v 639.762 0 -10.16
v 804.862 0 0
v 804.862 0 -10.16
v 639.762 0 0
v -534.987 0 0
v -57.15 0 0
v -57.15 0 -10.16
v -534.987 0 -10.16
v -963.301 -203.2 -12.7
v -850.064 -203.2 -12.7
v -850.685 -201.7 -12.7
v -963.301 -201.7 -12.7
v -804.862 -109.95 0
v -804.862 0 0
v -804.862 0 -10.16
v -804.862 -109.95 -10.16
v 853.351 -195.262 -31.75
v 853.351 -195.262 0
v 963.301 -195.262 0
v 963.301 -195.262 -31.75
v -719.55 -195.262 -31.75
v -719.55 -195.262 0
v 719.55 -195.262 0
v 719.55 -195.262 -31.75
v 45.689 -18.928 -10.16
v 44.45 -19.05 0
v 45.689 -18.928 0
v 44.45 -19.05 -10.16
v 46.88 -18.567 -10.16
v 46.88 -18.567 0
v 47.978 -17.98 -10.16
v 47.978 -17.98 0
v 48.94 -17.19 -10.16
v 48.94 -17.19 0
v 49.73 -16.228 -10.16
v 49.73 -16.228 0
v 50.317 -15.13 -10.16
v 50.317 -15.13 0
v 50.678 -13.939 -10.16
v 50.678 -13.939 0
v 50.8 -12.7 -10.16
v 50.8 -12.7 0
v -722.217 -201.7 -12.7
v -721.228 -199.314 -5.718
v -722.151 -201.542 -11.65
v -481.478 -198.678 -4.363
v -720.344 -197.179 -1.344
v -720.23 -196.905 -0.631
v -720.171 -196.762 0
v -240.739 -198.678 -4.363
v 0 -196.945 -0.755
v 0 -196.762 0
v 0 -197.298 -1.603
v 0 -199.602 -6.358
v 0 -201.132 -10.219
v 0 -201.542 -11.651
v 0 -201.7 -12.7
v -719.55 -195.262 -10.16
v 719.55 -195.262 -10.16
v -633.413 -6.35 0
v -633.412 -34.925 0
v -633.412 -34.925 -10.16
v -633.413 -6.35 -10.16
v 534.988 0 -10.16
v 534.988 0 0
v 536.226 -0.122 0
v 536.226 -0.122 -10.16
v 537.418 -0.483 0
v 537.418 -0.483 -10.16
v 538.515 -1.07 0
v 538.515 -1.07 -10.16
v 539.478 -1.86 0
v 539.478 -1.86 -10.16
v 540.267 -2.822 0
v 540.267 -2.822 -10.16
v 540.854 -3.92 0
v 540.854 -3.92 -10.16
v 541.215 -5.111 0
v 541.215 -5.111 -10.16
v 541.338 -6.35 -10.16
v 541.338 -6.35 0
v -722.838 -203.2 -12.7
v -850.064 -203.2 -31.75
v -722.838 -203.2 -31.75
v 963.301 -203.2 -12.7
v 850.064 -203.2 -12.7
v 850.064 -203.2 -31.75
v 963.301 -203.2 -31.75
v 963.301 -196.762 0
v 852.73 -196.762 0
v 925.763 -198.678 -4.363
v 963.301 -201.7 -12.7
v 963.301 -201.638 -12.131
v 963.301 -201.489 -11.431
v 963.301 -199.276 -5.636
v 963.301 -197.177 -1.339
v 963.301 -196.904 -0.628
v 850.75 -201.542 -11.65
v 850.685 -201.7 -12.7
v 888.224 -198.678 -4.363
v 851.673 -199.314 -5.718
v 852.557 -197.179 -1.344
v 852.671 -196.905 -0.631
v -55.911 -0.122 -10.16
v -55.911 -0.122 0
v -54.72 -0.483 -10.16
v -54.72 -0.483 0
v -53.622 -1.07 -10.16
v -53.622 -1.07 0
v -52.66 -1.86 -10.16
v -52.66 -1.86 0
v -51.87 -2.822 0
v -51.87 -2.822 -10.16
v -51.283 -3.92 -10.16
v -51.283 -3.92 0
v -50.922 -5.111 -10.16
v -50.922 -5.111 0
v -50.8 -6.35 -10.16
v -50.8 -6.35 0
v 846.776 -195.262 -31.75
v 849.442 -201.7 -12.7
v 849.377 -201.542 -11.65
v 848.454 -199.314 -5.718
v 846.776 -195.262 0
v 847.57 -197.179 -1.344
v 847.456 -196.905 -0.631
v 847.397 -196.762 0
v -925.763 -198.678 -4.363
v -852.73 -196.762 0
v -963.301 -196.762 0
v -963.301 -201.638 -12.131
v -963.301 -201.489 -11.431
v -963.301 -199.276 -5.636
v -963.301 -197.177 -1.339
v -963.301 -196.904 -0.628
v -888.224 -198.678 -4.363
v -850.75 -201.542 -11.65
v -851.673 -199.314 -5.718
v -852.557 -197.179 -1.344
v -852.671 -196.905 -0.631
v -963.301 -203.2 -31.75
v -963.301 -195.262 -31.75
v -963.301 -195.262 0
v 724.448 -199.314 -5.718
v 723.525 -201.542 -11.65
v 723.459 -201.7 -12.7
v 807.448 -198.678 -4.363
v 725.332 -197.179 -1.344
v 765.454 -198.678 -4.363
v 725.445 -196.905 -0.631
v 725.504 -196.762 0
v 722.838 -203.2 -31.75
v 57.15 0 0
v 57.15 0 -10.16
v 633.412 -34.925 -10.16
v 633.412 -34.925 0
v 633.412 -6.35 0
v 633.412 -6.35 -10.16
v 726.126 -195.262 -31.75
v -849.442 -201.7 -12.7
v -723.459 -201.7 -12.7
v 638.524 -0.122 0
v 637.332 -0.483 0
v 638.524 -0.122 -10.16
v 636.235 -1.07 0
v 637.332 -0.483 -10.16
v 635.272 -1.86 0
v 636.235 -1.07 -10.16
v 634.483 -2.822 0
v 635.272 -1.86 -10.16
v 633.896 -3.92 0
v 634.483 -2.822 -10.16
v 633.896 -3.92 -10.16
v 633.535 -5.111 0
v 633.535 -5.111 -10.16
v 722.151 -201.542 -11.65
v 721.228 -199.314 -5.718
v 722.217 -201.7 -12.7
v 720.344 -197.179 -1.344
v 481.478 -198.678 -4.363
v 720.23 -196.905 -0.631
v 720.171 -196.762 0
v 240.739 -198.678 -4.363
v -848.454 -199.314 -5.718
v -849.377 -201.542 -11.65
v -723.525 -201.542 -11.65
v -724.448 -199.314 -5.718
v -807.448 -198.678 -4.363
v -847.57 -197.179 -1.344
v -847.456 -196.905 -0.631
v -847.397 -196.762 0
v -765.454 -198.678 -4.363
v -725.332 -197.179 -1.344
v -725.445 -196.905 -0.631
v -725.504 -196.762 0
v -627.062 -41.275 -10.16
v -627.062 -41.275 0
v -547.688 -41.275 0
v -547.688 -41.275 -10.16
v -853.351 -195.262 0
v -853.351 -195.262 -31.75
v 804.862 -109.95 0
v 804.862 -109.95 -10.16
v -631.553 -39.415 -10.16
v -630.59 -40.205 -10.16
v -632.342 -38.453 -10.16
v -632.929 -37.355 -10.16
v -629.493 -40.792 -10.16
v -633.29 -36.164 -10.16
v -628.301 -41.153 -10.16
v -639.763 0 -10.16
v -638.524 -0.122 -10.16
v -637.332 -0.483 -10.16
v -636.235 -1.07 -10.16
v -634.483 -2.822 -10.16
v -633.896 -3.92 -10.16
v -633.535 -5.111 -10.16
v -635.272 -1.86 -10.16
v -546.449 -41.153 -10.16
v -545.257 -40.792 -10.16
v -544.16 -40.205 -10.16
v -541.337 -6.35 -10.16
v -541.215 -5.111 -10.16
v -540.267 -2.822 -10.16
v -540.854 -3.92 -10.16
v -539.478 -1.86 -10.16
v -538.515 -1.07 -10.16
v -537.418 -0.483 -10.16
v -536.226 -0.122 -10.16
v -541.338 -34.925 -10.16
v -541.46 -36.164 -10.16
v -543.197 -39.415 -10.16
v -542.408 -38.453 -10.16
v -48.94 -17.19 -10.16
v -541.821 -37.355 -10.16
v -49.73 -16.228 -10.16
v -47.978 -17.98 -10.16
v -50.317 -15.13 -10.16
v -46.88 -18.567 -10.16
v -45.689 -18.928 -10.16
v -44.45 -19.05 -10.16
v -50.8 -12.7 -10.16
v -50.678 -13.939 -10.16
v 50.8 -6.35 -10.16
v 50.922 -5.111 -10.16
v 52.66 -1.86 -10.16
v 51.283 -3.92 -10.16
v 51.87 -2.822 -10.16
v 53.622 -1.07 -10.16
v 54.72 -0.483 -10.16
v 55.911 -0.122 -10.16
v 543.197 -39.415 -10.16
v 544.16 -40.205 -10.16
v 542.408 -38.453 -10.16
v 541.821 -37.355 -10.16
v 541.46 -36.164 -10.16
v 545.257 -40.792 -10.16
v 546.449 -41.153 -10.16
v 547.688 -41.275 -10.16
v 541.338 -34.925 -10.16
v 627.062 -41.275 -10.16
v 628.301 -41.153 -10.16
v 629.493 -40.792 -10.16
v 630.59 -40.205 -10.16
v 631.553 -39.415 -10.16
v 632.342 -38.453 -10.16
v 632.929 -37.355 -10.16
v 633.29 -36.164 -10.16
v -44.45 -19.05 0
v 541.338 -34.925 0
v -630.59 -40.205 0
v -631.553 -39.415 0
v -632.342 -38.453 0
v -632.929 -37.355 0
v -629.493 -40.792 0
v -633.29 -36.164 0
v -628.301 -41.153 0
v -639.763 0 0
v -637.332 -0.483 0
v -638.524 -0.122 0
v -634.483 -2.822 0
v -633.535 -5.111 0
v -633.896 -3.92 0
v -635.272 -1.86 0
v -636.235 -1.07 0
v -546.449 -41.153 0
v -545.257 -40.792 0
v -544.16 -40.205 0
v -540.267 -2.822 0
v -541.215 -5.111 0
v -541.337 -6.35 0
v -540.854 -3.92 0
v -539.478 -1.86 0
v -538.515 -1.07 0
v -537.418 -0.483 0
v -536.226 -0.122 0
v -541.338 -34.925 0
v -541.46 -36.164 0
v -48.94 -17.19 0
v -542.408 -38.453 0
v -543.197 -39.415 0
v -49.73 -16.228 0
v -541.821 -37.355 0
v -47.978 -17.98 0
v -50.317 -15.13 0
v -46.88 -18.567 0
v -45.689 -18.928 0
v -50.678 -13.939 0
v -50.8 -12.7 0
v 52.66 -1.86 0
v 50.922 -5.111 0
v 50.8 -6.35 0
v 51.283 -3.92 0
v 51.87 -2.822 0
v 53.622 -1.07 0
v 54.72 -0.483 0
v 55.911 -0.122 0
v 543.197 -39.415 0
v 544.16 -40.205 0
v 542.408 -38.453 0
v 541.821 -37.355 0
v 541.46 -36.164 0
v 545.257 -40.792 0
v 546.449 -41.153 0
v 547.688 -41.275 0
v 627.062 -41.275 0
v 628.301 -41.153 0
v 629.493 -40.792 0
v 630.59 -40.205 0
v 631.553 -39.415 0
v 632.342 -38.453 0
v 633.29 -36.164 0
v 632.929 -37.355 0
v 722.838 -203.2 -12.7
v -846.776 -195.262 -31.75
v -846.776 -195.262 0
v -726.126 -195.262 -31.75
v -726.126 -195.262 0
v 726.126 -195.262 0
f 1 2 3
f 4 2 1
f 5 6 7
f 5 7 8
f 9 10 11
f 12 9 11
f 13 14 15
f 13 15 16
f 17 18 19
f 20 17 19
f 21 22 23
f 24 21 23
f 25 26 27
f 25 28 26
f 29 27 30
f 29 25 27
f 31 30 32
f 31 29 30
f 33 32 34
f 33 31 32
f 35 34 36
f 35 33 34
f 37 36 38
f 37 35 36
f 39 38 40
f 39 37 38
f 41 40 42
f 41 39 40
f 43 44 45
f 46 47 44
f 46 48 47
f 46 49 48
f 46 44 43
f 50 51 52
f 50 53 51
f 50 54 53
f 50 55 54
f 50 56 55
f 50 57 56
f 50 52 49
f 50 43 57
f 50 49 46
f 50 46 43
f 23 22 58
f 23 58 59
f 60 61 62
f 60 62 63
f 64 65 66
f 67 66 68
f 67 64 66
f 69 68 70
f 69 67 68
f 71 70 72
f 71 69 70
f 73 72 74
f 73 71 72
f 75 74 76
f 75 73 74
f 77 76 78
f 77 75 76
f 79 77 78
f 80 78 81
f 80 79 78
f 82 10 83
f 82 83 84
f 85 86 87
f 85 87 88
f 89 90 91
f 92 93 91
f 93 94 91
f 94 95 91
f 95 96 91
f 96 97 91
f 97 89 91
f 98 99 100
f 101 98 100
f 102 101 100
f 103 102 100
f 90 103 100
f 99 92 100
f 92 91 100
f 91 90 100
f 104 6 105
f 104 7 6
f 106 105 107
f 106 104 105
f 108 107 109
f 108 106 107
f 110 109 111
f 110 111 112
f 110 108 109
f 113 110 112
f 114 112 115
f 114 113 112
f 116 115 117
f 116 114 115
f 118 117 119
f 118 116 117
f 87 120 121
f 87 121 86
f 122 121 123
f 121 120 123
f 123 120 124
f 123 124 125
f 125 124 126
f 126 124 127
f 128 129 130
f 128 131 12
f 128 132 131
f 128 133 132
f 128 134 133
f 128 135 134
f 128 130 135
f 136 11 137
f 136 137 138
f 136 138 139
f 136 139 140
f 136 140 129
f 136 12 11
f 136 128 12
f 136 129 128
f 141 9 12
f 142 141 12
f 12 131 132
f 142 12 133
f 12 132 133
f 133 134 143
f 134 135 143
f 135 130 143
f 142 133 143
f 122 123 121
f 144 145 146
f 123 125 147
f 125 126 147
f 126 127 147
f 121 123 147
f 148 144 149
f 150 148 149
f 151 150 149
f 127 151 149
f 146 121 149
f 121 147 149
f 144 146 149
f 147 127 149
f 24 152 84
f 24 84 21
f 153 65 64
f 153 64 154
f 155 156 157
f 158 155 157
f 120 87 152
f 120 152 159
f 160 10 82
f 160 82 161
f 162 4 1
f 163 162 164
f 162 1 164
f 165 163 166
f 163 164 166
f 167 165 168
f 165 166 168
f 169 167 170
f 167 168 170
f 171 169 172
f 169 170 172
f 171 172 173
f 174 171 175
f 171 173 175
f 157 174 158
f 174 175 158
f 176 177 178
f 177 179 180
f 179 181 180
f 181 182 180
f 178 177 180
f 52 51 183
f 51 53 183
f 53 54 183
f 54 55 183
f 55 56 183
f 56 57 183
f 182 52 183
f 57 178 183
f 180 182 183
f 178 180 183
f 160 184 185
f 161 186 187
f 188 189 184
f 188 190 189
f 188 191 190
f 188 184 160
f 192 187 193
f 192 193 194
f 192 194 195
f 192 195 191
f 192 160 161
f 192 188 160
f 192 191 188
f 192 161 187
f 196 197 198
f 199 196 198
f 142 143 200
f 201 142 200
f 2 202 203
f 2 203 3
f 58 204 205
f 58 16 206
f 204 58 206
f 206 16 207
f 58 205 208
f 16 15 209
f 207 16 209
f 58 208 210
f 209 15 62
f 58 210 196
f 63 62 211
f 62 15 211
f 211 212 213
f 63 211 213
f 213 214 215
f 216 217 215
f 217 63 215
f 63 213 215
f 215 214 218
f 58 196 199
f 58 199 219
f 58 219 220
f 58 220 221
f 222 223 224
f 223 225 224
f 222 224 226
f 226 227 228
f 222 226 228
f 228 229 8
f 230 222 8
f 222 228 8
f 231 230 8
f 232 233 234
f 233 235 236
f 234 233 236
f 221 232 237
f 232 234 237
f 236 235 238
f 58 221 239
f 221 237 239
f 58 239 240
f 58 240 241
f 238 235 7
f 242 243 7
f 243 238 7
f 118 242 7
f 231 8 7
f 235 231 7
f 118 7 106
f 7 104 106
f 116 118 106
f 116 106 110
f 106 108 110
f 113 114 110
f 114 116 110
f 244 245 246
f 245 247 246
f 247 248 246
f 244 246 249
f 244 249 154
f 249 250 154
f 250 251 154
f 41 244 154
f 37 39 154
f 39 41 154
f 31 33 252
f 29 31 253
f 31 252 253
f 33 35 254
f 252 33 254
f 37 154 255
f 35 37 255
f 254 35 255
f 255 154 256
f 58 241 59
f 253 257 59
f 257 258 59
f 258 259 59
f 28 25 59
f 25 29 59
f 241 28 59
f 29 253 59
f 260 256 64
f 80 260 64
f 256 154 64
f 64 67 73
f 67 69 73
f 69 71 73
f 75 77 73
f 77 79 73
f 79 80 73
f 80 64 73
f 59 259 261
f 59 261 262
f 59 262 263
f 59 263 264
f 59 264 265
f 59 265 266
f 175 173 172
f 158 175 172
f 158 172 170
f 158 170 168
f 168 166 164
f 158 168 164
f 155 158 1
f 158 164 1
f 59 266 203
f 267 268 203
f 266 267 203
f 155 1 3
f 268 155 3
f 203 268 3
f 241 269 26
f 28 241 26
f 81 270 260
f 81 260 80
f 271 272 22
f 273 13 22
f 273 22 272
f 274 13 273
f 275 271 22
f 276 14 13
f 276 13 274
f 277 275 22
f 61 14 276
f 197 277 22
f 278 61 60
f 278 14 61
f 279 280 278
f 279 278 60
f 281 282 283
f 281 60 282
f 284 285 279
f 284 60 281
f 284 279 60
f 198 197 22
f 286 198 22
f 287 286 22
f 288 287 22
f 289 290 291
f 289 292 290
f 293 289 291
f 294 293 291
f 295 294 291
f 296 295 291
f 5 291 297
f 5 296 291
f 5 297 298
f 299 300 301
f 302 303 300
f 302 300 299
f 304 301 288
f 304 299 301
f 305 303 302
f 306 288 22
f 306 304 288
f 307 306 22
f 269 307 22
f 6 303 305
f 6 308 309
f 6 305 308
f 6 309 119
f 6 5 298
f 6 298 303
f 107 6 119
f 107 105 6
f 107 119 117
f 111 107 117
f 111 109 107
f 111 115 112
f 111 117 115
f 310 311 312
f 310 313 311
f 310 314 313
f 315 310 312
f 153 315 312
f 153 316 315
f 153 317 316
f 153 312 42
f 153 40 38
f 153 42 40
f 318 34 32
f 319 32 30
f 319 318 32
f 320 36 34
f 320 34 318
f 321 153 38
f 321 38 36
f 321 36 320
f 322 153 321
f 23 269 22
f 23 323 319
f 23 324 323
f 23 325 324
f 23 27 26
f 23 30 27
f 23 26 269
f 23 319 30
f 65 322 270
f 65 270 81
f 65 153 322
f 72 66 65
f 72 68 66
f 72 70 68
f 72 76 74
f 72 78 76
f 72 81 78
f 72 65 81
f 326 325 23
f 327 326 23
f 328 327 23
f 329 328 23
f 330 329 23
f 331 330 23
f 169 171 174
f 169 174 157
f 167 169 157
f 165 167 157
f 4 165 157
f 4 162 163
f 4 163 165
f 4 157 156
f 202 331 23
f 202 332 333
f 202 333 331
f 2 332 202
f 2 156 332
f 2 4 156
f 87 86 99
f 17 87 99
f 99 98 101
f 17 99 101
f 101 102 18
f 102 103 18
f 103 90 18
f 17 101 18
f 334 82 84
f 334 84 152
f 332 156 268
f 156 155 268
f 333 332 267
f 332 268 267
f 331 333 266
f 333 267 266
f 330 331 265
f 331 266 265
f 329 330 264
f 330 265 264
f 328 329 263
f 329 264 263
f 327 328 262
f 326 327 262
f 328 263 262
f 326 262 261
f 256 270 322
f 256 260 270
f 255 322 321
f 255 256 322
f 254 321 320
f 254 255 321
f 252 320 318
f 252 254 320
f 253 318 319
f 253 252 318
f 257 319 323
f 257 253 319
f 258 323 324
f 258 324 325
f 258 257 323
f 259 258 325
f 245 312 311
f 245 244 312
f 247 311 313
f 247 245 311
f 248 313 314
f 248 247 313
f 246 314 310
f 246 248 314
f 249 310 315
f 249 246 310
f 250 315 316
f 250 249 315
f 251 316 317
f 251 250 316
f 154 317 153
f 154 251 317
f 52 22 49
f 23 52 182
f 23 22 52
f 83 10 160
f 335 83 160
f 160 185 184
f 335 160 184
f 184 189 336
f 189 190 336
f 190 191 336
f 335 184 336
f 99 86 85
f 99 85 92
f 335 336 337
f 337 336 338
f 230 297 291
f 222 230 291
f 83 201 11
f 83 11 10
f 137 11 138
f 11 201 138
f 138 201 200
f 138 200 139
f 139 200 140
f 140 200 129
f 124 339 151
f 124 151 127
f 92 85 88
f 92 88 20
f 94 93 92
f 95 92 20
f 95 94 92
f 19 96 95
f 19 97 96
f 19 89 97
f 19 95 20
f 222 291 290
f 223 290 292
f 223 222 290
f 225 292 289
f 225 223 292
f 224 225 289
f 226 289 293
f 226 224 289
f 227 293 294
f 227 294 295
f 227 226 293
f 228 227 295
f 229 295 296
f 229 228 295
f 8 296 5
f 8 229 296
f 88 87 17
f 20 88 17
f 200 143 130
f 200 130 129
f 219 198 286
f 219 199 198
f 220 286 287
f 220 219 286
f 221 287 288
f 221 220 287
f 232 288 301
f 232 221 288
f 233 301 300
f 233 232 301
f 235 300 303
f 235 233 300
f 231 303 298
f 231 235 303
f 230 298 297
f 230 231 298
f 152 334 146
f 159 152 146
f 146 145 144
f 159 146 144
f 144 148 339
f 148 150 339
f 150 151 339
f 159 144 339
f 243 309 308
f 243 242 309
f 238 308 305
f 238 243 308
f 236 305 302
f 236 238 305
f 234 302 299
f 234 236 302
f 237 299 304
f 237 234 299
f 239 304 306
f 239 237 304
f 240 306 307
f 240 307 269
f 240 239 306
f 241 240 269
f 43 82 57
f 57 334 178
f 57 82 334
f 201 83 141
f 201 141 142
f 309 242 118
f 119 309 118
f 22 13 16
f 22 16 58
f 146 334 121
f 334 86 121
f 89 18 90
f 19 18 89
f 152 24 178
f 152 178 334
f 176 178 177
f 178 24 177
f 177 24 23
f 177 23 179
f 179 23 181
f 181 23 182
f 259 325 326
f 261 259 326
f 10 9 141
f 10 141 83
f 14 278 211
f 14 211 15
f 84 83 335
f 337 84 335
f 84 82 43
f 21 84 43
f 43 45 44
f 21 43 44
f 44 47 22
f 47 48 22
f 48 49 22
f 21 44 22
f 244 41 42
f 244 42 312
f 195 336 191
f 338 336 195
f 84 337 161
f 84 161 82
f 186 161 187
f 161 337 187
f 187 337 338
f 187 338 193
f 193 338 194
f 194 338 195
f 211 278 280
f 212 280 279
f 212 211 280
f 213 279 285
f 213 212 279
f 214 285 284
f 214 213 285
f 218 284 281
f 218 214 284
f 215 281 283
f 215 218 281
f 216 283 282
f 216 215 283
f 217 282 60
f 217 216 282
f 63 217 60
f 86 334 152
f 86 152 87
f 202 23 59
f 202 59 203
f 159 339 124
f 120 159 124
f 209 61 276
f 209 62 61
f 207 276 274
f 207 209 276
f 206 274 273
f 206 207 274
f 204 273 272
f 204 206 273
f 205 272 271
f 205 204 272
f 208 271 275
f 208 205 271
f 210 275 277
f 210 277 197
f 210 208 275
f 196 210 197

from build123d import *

# Parameters (mm, degrees)
F3_DEPTH      = 10.16
F4_W          = 2032
F4_H          = 7.9375
F5_DEPTH      = 57.15
F7_DEPTH      = 1016.001
F7_DEPTH_BACK = 1016.001
F8_W          = 7.9375
F8_H          = 25.4
F9_DEPTH      = 2032.0010001
F10_W         = 52.698585695
F10_H         = 7.9375
F11_DEPTH     = 31.7510001
F12_W         = 92.075
F12_H         = 41.275
F12_W_2       = 101.6
F12_H_2       = 19.05
F13_DEPTH     = 31.7510001
F14_R         = 6.35


# Not quite as in the source:
# - a variable given as a bare number and used for a length is read in inches; the dataset says mm whatever the document's units were


with BuildPart() as f3:
    # F2 (on Top) → F3 (new body)
    with BuildSketch(Plane.XY):
        Polygon((804.8625, 0), (-804.8625, 0), (-804.8625, -109.9500668498), (-719.5500668498, -195.2625), (719.5500668498, -195.2625), (804.8625, -109.9500668498), align=None)
    extrude(amount=-F3_DEPTH)

    # F12 (on face) → F13 (cut, through all)
    with BuildSketch(Plane.XY):
        with Locations((-587.375, -20.6375)):
            Rectangle(F12_W, F12_H)
        with Locations((0, -9.525)):
            Rectangle(F12_W_2, F12_H_2)
        with Locations((587.375, -20.6375)):
            Rectangle(F12_W, F12_H)
    extrude(amount=-F13_DEPTH, mode=Mode.SUBTRACT)

    # F14
    f14_edges = [f3.edges().sort_by_distance(p)[0] for p in [
        (-633.4125, 0, -5.08),
        (-633.4125, -41.275, -5.08),
        (-541.3375, -41.275, -5.08),
        (-541.3375, 0, -5.08),
        (-50.8, -19.05, -5.08),
        (-50.8, 0, -5.08),
        (50.8, 0, -5.08),
        (50.8, -19.05, -5.08),
        (633.4125, -41.275, -5.08),
        (633.4125, 0, -5.08),
        (541.3375, -41.275, -5.08),
        (541.3375, 0, -5.08),
    ]]
    fillet(f14_edges, radius=F14_R)


with BuildPart() as f5:
    # F4 (on face) → F5 (new body)
    with BuildSketch(Plane.XY):
        with Locations((0, -199.23125)):
            Rectangle(F4_W, F4_H)
    extrude(amount=-F5_DEPTH)

    # F6 (on Right) → F7 (cut, two sides)
    with BuildSketch(Plane.YZ) as f7_sk:
        with BuildLine():
            Line((-203.2, -12.7), (-201.7, -12.7))
            add(Edge.make_bspline(
                [(-196.7625, 0), (-196.8148604761, -0.3804030605), (-197.1200745243, -1.3902041101), (-198.7386405945, -4.2395784301), (-201.6317836716, -10.8737146377), (-201.7, -12.7)],
                knots=[0, 0, 0, 0, 0.1863946303, 0.5014086831, 1, 1, 1, 1], degree=3))
            Line((-196.7625, 0), (-203.2, 0))
            Line((-203.2, 0), (-203.2, -12.7))
        make_face()
    extrude(amount=-F7_DEPTH, mode=Mode.SUBTRACT)
    extrude(f7_sk.sketch, amount=F7_DEPTH_BACK, mode=Mode.SUBTRACT)

    # F8 (on face) → F9 (cut, through all)
    with BuildSketch(Plane.YZ.offset(1016)):
        with Locations((-199.23125, -44.45)):
            Rectangle(F8_W, F8_H)
    extrude(amount=-F9_DEPTH, mode=Mode.SUBTRACT)

    # F10 (on face) → F11 (cut, through all)
    with BuildSketch(Plane.XY):
        Polygon((-722.8378870012, -203.2), (-719.5500668498, -195.2625), (-726.1257071525, -195.2625), align=None)
        Polygon((-850.0635273039, -203.2), (-846.7757071525, -195.2625), (-853.3513474552, -195.2625), align=None)
        Polygon((726.1257071525, -195.2625), (719.5500668498, -195.2625), (722.8378870012, -203.2), align=None)
        Polygon((853.3513474552, -195.2625), (846.7757071525, -195.2625), (850.0635273039, -203.2), align=None)
        with Locations((-989.6507071525, -199.23125)):
            Rectangle(F10_W, F10_H)
        with Locations((989.6507071525, -199.23125)):
            Rectangle(F10_W, F10_H)
    extrude(amount=-F11_DEPTH, mode=Mode.SUBTRACT)


solid = Compound([f3.part, f5.part])
